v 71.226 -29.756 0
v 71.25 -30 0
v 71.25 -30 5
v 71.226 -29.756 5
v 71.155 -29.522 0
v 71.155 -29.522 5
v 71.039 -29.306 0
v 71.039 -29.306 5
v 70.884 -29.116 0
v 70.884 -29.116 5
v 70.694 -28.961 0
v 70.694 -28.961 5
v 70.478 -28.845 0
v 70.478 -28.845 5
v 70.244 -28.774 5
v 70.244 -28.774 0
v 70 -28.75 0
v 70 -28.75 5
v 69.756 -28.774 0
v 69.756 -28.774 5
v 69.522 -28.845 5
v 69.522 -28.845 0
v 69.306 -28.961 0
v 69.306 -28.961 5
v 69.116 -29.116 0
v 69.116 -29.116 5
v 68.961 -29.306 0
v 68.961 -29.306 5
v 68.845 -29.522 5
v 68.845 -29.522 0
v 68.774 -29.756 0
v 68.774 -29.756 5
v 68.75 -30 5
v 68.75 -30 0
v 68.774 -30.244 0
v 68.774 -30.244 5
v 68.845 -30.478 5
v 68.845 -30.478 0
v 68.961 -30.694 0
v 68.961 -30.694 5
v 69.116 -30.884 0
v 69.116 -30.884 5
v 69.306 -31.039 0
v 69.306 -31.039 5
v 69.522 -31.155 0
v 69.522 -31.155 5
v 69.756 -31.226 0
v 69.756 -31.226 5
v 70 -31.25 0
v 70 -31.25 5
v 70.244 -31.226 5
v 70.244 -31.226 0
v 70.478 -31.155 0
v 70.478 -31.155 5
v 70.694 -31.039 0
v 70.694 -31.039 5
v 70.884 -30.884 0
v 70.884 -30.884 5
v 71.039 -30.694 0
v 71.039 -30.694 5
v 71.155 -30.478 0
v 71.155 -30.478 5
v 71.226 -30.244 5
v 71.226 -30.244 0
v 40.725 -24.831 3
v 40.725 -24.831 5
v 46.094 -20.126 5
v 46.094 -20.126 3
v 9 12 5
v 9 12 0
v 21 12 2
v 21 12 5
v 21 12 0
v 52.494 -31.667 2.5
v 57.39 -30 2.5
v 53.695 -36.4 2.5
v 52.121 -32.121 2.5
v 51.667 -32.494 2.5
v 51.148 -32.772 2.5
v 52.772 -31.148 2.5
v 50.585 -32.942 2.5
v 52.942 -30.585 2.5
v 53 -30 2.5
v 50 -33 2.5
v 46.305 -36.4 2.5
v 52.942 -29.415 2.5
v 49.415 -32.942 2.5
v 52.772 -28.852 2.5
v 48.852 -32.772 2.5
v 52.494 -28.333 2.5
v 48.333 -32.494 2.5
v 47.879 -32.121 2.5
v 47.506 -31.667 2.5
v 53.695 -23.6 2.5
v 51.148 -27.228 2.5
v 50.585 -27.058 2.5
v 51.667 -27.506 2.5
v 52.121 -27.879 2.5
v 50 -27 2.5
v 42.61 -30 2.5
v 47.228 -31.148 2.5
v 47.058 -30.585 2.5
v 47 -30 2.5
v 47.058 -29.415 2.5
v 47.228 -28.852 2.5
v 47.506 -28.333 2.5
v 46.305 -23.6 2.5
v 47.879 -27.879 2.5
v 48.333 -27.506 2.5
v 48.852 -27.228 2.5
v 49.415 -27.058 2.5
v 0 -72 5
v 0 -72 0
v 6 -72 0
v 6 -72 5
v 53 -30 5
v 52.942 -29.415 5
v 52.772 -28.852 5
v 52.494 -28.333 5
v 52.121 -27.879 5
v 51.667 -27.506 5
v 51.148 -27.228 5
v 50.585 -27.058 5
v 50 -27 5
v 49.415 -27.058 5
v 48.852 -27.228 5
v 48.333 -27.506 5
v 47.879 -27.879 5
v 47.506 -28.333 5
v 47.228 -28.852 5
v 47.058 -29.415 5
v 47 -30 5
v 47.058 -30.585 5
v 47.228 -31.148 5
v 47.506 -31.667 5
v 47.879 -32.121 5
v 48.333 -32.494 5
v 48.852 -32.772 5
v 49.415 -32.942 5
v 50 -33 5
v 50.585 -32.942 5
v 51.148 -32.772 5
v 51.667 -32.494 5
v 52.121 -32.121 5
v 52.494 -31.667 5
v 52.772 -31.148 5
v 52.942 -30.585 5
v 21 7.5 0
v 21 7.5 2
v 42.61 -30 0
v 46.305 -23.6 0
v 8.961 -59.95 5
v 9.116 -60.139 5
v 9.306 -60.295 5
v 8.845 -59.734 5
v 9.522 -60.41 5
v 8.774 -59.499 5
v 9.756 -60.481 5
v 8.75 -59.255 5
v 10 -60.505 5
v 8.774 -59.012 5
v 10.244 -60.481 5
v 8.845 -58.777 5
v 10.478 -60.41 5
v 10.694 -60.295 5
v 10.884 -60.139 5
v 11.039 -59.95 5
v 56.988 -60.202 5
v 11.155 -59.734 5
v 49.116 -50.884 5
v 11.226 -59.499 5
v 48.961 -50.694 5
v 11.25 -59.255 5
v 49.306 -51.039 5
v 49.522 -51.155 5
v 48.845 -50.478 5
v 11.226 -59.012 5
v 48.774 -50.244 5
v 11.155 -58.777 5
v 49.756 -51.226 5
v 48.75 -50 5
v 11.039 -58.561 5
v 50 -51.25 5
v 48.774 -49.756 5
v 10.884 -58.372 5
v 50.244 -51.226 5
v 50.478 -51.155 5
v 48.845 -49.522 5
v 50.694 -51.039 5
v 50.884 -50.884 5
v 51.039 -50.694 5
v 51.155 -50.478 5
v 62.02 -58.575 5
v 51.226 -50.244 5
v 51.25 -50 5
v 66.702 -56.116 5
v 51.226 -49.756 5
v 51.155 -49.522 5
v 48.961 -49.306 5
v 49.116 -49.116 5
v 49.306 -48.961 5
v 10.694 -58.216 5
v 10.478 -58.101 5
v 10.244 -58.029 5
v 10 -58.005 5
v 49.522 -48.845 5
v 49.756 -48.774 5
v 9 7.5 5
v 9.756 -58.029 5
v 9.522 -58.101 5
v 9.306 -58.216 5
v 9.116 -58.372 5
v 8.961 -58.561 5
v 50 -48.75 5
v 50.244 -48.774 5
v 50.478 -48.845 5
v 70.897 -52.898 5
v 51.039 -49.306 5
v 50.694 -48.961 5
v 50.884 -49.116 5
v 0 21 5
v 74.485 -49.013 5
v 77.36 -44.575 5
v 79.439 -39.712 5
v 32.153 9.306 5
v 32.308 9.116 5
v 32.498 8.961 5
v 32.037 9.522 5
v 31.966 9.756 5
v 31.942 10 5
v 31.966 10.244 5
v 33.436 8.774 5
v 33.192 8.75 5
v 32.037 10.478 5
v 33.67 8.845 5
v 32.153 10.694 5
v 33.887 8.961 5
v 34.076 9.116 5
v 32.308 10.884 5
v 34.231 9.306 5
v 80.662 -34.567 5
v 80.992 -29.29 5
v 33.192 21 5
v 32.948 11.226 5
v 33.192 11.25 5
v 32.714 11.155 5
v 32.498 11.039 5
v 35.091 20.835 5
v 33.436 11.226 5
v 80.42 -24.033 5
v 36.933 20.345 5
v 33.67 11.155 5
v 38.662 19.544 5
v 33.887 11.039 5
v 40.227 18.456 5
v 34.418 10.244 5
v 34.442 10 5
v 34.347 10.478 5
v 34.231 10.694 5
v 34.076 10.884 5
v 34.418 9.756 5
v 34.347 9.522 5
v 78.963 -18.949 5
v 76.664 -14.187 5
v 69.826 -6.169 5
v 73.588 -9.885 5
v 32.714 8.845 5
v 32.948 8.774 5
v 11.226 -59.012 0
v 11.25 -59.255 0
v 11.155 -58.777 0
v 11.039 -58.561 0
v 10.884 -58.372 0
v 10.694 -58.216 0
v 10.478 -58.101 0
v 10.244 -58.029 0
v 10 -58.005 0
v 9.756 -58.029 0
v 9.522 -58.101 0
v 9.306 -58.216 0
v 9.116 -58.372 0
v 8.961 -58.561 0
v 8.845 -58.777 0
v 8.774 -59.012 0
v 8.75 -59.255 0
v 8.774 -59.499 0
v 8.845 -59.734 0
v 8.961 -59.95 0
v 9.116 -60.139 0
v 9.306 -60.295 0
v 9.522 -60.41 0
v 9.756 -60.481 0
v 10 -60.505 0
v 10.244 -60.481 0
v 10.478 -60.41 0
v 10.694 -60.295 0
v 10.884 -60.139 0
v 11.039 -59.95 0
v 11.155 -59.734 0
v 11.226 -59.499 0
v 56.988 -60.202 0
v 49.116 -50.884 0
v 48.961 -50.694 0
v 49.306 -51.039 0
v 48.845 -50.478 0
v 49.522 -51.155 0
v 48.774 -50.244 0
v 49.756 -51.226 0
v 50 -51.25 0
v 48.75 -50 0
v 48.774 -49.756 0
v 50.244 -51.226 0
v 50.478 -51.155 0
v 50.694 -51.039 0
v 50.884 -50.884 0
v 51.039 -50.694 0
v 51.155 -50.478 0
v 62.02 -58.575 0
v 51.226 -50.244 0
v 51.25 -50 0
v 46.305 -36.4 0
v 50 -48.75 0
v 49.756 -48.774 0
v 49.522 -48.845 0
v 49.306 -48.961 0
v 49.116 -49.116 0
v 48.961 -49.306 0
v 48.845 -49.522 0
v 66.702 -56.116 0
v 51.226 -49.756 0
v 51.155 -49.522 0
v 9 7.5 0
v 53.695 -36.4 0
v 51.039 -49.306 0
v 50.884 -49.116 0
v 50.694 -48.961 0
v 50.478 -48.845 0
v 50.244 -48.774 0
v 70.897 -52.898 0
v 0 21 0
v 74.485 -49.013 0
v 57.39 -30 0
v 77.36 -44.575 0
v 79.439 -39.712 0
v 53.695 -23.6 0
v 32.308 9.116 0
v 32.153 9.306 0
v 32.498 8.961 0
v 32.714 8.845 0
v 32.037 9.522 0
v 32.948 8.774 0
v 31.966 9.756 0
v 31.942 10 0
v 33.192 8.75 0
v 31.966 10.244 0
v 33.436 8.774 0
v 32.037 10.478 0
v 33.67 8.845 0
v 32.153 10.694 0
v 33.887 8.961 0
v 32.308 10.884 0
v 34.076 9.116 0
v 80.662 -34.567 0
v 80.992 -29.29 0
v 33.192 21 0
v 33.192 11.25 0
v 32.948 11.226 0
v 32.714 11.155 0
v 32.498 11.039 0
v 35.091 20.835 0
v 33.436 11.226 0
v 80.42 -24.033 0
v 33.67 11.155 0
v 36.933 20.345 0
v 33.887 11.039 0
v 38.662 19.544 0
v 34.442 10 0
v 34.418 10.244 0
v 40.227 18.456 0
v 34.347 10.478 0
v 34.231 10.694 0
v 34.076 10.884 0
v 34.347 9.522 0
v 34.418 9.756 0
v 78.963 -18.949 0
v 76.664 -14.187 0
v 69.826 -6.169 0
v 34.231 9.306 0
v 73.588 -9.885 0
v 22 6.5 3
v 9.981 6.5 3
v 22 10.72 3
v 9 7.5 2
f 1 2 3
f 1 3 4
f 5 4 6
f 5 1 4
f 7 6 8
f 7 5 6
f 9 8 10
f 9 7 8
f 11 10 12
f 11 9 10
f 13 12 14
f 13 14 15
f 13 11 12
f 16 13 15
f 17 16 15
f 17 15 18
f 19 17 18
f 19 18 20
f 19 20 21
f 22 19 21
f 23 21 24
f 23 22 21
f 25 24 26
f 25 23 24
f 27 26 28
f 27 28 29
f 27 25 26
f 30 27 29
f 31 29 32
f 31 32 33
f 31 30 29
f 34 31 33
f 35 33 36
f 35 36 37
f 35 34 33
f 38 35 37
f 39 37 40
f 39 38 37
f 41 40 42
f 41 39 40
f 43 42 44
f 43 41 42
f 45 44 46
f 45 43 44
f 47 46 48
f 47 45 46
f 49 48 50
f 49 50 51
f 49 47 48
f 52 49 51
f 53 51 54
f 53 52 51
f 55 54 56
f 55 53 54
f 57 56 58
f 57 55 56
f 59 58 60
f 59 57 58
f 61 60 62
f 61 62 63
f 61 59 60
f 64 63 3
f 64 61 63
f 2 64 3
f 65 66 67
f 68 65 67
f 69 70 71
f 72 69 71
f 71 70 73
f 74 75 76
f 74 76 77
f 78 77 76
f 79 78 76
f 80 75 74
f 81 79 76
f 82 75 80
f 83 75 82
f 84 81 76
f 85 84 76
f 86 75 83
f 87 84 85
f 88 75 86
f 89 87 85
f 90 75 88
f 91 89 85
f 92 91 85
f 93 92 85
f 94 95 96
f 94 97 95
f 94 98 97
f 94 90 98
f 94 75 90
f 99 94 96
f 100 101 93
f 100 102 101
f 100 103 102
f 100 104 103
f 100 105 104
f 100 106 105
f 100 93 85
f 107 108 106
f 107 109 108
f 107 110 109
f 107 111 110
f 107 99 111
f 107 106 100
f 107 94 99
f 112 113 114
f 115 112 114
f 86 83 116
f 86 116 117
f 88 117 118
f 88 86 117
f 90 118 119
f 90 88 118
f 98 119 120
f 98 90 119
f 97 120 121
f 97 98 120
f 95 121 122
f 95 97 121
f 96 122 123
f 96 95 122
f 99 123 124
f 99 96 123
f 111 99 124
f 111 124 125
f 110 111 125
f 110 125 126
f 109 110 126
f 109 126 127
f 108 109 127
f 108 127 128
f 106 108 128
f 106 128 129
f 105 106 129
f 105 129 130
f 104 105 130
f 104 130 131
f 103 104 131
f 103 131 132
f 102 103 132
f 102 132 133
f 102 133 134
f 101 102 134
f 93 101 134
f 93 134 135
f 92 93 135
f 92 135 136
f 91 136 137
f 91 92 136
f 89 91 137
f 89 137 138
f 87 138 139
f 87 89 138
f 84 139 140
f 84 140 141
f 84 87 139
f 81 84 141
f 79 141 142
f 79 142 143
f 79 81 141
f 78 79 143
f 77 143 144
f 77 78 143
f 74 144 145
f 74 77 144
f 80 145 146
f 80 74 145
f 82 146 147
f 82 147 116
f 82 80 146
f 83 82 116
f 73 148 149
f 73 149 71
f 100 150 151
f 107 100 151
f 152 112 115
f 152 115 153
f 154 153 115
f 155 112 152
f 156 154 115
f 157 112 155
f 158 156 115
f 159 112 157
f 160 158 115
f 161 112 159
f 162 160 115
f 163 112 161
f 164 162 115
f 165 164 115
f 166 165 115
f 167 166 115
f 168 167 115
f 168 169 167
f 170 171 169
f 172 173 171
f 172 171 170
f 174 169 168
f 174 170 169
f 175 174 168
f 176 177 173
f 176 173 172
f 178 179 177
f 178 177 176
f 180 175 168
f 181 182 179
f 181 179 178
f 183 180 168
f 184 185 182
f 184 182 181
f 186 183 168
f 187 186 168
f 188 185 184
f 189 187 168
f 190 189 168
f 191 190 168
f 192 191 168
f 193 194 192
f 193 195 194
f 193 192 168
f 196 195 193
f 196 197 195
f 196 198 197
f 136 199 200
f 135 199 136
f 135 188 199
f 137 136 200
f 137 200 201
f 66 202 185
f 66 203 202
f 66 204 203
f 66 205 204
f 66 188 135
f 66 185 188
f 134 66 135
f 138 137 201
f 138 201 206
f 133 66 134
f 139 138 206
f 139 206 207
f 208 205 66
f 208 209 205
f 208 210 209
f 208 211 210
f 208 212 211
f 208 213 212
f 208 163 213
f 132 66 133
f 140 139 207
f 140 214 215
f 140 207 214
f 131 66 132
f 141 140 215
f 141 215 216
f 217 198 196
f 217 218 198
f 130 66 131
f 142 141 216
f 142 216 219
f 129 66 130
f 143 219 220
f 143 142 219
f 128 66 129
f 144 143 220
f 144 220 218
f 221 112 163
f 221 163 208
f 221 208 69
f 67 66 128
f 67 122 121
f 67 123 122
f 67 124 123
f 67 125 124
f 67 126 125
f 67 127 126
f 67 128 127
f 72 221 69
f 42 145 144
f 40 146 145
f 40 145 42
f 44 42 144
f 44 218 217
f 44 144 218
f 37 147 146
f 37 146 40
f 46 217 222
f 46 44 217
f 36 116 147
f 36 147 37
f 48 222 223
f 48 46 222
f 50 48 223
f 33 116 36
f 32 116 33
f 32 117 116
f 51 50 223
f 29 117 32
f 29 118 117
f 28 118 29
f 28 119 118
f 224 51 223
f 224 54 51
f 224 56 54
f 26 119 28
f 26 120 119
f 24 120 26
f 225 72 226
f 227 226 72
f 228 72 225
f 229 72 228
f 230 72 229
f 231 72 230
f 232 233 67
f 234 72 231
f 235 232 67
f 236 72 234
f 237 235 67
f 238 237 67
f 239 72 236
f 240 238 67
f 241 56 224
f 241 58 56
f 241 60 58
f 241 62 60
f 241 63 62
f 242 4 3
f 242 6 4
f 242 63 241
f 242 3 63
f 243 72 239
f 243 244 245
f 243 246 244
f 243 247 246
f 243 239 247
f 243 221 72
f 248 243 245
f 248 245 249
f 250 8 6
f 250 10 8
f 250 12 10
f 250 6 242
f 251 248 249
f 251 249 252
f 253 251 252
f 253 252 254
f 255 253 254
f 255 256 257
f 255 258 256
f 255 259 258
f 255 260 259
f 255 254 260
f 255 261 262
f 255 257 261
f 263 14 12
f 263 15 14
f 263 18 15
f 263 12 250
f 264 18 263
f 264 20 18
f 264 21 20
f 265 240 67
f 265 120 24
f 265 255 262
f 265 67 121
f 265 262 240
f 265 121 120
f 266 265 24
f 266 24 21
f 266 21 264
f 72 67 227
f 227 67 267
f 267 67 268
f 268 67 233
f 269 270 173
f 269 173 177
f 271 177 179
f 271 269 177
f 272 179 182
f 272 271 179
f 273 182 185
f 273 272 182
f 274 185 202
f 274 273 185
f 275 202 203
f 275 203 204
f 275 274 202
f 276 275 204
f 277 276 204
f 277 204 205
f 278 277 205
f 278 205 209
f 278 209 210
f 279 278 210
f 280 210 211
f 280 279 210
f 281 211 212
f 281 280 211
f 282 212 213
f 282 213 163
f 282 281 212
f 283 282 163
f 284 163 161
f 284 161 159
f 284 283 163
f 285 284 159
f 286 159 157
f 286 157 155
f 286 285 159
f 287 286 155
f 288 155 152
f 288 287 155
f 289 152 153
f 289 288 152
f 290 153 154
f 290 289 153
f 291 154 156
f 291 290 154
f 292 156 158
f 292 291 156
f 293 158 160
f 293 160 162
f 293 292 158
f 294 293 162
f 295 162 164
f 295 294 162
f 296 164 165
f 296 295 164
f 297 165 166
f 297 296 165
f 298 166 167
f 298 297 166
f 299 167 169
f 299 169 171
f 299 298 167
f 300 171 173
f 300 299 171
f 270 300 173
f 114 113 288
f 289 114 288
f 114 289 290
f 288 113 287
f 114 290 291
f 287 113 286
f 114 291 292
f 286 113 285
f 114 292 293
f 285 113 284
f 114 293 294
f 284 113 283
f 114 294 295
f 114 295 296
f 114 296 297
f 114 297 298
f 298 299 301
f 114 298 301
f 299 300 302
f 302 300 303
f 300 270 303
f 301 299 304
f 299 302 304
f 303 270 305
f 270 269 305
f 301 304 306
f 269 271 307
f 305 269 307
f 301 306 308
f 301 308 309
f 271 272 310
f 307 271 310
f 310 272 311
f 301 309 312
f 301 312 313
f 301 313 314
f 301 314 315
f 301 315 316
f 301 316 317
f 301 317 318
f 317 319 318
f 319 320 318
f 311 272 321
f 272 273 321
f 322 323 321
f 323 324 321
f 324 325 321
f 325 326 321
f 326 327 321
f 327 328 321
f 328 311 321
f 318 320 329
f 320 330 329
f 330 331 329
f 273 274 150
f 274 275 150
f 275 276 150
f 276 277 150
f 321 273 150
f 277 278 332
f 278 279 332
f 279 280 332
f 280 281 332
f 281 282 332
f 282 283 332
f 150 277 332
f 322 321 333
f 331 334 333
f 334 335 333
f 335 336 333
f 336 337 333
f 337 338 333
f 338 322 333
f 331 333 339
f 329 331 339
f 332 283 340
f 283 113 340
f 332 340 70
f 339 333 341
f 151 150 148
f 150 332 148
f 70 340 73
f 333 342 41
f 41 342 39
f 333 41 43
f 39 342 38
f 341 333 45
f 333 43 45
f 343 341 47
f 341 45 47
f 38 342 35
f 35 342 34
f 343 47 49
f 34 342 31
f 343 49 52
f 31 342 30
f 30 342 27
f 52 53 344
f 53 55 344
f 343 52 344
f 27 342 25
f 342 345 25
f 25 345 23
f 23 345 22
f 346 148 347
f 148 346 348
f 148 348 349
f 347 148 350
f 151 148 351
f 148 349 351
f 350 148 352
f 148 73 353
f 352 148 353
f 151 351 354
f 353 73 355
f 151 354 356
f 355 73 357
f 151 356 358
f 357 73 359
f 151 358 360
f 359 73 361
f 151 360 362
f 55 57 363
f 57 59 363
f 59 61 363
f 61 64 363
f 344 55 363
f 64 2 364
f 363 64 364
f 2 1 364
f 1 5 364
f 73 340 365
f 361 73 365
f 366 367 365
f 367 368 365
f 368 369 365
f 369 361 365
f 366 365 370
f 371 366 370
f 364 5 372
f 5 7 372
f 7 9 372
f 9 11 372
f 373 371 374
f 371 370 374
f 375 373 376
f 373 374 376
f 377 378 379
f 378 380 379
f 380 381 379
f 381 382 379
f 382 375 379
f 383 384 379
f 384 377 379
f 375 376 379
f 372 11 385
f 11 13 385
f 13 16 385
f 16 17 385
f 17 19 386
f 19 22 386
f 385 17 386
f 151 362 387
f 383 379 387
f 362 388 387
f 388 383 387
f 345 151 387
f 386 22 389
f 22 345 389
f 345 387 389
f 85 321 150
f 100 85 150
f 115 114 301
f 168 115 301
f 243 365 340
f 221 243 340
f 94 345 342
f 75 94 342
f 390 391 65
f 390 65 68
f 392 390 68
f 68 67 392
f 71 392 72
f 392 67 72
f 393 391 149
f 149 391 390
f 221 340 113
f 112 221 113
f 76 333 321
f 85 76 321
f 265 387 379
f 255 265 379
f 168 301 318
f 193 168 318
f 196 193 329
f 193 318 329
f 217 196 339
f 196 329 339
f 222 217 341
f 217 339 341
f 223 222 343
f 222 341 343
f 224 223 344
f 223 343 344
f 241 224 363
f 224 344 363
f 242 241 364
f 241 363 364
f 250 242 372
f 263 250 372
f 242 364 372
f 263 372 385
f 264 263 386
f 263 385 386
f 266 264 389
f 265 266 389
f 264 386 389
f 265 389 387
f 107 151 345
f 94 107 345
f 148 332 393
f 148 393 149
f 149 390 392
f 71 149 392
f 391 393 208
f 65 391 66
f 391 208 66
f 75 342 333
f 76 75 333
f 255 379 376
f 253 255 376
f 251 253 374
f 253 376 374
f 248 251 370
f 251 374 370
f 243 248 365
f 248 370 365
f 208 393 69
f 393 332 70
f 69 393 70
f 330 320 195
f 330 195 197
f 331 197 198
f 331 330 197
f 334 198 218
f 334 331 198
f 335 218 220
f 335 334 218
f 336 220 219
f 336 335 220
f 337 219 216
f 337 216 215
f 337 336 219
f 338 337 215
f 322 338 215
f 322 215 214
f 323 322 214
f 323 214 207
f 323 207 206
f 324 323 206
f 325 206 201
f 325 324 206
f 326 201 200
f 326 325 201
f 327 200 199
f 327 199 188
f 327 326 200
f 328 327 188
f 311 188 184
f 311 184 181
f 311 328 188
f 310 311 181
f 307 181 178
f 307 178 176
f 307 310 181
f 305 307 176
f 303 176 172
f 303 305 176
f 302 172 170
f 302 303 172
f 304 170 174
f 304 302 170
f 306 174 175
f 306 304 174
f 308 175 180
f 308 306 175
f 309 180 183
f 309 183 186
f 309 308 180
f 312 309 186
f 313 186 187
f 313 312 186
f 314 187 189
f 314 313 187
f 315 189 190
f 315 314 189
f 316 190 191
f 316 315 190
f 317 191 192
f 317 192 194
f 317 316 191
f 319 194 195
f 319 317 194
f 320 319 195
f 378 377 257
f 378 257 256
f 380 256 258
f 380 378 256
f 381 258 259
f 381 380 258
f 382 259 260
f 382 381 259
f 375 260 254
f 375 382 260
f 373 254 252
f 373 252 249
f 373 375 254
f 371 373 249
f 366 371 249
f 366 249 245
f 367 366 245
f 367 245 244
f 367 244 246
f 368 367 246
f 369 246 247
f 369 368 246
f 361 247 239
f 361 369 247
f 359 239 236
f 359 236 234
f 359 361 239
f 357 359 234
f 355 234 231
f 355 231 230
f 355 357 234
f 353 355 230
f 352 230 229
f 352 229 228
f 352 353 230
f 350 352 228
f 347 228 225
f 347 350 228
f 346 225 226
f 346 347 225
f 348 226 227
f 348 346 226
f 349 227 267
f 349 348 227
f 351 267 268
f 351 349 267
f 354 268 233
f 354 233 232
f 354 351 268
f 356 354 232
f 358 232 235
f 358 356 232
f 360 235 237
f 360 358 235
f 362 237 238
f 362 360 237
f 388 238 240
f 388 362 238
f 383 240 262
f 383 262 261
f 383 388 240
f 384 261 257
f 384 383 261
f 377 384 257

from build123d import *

# Parameters (mm, degrees)
SKETCH1_R           = 3
SKETCH1_R_2         = 1.25
SKETCH1_W           = 12
SKETCH1_H           = 4.5
BOSS_EXTRUDE1_DEPTH = 5
CUT_EXTRUDE1_DEPTH  = 2
CUT_EXTRUDE2_DEPTH  = 2.5
CHAMFER1_SIZE       = 1


with BuildPart() as part:
    # Sketch1 → Boss-Extrude1 (new body)
    with BuildSketch(Plane.XY):
        with BuildLine():
            Line((33.192050804, 21), (0, 21))
            Line((0, 21), (0, -72))
            Line((0, -72), (6, -72))
            Line((6, -72), (56.988314669, -60.202043939))
            ThreePointArc((56.988314669, -60.202043939), (80.160384186, -37.165976959), (69.826332353, -6.169000327))
            Line((69.826332353, -6.169000327), (40.227200994, 18.456161174))
            ThreePointArc((40.227200994, 18.456161174), (36.932520499, 20.344509967), (33.192050804, 21))
        make_face()
        with Locations((50, -30)):
            Circle(SKETCH1_R, mode=Mode.SUBTRACT)
        with Locations((70, -30)):
            Circle(SKETCH1_R_2, mode=Mode.SUBTRACT)
        with Locations((15, 9.75)):
            Rectangle(SKETCH1_W, SKETCH1_H, mode=Mode.SUBTRACT)
        with Locations((33.192050804, 10)):
            Circle(SKETCH1_R_2, mode=Mode.SUBTRACT)
        with Locations((10, -59.255419511)):
            Circle(SKETCH1_R_2, mode=Mode.SUBTRACT)
        with Locations((50, -50)):
            Circle(SKETCH1_R_2, mode=Mode.SUBTRACT)
    extrude(amount=BOSS_EXTRUDE1_DEPTH)

    # Sketch2 → Cut-Extrude1 (cut)
    with BuildSketch(Plane.XY.offset(5)):
        Polygon((9, 7.5), (40.725052348, -24.831204578), (46.094372356, -20.126440724), (21, 12), align=None)
    extrude(amount=-CUT_EXTRUDE1_DEPTH, mode=Mode.SUBTRACT)

    # Sketch3 → Cut-Extrude2 (cut)
    with BuildSketch(Plane(origin=(0, 0, 0), x_dir=(-1, 0, 0), z_dir=(0, 0, -1))):
        Polygon((-42.609916554, -30), (-46.304958277, -23.6), (-53.695041723, -23.6), (-57.390083446, -30), (-53.695041723, -36.4), (-46.304958277, -36.4), align=None)
    extrude(amount=-CUT_EXTRUDE2_DEPTH, mode=Mode.SUBTRACT)

    # Chamfer1
    chamfer1_edges = [part.edges().sort_by_distance(p)[0] for p in [
        (21, 9.75, 3),
        (15, 7.5, 3),
    ]]
    chamfer(chamfer1_edges, length=CHAMFER1_SIZE)


solid = part.part
